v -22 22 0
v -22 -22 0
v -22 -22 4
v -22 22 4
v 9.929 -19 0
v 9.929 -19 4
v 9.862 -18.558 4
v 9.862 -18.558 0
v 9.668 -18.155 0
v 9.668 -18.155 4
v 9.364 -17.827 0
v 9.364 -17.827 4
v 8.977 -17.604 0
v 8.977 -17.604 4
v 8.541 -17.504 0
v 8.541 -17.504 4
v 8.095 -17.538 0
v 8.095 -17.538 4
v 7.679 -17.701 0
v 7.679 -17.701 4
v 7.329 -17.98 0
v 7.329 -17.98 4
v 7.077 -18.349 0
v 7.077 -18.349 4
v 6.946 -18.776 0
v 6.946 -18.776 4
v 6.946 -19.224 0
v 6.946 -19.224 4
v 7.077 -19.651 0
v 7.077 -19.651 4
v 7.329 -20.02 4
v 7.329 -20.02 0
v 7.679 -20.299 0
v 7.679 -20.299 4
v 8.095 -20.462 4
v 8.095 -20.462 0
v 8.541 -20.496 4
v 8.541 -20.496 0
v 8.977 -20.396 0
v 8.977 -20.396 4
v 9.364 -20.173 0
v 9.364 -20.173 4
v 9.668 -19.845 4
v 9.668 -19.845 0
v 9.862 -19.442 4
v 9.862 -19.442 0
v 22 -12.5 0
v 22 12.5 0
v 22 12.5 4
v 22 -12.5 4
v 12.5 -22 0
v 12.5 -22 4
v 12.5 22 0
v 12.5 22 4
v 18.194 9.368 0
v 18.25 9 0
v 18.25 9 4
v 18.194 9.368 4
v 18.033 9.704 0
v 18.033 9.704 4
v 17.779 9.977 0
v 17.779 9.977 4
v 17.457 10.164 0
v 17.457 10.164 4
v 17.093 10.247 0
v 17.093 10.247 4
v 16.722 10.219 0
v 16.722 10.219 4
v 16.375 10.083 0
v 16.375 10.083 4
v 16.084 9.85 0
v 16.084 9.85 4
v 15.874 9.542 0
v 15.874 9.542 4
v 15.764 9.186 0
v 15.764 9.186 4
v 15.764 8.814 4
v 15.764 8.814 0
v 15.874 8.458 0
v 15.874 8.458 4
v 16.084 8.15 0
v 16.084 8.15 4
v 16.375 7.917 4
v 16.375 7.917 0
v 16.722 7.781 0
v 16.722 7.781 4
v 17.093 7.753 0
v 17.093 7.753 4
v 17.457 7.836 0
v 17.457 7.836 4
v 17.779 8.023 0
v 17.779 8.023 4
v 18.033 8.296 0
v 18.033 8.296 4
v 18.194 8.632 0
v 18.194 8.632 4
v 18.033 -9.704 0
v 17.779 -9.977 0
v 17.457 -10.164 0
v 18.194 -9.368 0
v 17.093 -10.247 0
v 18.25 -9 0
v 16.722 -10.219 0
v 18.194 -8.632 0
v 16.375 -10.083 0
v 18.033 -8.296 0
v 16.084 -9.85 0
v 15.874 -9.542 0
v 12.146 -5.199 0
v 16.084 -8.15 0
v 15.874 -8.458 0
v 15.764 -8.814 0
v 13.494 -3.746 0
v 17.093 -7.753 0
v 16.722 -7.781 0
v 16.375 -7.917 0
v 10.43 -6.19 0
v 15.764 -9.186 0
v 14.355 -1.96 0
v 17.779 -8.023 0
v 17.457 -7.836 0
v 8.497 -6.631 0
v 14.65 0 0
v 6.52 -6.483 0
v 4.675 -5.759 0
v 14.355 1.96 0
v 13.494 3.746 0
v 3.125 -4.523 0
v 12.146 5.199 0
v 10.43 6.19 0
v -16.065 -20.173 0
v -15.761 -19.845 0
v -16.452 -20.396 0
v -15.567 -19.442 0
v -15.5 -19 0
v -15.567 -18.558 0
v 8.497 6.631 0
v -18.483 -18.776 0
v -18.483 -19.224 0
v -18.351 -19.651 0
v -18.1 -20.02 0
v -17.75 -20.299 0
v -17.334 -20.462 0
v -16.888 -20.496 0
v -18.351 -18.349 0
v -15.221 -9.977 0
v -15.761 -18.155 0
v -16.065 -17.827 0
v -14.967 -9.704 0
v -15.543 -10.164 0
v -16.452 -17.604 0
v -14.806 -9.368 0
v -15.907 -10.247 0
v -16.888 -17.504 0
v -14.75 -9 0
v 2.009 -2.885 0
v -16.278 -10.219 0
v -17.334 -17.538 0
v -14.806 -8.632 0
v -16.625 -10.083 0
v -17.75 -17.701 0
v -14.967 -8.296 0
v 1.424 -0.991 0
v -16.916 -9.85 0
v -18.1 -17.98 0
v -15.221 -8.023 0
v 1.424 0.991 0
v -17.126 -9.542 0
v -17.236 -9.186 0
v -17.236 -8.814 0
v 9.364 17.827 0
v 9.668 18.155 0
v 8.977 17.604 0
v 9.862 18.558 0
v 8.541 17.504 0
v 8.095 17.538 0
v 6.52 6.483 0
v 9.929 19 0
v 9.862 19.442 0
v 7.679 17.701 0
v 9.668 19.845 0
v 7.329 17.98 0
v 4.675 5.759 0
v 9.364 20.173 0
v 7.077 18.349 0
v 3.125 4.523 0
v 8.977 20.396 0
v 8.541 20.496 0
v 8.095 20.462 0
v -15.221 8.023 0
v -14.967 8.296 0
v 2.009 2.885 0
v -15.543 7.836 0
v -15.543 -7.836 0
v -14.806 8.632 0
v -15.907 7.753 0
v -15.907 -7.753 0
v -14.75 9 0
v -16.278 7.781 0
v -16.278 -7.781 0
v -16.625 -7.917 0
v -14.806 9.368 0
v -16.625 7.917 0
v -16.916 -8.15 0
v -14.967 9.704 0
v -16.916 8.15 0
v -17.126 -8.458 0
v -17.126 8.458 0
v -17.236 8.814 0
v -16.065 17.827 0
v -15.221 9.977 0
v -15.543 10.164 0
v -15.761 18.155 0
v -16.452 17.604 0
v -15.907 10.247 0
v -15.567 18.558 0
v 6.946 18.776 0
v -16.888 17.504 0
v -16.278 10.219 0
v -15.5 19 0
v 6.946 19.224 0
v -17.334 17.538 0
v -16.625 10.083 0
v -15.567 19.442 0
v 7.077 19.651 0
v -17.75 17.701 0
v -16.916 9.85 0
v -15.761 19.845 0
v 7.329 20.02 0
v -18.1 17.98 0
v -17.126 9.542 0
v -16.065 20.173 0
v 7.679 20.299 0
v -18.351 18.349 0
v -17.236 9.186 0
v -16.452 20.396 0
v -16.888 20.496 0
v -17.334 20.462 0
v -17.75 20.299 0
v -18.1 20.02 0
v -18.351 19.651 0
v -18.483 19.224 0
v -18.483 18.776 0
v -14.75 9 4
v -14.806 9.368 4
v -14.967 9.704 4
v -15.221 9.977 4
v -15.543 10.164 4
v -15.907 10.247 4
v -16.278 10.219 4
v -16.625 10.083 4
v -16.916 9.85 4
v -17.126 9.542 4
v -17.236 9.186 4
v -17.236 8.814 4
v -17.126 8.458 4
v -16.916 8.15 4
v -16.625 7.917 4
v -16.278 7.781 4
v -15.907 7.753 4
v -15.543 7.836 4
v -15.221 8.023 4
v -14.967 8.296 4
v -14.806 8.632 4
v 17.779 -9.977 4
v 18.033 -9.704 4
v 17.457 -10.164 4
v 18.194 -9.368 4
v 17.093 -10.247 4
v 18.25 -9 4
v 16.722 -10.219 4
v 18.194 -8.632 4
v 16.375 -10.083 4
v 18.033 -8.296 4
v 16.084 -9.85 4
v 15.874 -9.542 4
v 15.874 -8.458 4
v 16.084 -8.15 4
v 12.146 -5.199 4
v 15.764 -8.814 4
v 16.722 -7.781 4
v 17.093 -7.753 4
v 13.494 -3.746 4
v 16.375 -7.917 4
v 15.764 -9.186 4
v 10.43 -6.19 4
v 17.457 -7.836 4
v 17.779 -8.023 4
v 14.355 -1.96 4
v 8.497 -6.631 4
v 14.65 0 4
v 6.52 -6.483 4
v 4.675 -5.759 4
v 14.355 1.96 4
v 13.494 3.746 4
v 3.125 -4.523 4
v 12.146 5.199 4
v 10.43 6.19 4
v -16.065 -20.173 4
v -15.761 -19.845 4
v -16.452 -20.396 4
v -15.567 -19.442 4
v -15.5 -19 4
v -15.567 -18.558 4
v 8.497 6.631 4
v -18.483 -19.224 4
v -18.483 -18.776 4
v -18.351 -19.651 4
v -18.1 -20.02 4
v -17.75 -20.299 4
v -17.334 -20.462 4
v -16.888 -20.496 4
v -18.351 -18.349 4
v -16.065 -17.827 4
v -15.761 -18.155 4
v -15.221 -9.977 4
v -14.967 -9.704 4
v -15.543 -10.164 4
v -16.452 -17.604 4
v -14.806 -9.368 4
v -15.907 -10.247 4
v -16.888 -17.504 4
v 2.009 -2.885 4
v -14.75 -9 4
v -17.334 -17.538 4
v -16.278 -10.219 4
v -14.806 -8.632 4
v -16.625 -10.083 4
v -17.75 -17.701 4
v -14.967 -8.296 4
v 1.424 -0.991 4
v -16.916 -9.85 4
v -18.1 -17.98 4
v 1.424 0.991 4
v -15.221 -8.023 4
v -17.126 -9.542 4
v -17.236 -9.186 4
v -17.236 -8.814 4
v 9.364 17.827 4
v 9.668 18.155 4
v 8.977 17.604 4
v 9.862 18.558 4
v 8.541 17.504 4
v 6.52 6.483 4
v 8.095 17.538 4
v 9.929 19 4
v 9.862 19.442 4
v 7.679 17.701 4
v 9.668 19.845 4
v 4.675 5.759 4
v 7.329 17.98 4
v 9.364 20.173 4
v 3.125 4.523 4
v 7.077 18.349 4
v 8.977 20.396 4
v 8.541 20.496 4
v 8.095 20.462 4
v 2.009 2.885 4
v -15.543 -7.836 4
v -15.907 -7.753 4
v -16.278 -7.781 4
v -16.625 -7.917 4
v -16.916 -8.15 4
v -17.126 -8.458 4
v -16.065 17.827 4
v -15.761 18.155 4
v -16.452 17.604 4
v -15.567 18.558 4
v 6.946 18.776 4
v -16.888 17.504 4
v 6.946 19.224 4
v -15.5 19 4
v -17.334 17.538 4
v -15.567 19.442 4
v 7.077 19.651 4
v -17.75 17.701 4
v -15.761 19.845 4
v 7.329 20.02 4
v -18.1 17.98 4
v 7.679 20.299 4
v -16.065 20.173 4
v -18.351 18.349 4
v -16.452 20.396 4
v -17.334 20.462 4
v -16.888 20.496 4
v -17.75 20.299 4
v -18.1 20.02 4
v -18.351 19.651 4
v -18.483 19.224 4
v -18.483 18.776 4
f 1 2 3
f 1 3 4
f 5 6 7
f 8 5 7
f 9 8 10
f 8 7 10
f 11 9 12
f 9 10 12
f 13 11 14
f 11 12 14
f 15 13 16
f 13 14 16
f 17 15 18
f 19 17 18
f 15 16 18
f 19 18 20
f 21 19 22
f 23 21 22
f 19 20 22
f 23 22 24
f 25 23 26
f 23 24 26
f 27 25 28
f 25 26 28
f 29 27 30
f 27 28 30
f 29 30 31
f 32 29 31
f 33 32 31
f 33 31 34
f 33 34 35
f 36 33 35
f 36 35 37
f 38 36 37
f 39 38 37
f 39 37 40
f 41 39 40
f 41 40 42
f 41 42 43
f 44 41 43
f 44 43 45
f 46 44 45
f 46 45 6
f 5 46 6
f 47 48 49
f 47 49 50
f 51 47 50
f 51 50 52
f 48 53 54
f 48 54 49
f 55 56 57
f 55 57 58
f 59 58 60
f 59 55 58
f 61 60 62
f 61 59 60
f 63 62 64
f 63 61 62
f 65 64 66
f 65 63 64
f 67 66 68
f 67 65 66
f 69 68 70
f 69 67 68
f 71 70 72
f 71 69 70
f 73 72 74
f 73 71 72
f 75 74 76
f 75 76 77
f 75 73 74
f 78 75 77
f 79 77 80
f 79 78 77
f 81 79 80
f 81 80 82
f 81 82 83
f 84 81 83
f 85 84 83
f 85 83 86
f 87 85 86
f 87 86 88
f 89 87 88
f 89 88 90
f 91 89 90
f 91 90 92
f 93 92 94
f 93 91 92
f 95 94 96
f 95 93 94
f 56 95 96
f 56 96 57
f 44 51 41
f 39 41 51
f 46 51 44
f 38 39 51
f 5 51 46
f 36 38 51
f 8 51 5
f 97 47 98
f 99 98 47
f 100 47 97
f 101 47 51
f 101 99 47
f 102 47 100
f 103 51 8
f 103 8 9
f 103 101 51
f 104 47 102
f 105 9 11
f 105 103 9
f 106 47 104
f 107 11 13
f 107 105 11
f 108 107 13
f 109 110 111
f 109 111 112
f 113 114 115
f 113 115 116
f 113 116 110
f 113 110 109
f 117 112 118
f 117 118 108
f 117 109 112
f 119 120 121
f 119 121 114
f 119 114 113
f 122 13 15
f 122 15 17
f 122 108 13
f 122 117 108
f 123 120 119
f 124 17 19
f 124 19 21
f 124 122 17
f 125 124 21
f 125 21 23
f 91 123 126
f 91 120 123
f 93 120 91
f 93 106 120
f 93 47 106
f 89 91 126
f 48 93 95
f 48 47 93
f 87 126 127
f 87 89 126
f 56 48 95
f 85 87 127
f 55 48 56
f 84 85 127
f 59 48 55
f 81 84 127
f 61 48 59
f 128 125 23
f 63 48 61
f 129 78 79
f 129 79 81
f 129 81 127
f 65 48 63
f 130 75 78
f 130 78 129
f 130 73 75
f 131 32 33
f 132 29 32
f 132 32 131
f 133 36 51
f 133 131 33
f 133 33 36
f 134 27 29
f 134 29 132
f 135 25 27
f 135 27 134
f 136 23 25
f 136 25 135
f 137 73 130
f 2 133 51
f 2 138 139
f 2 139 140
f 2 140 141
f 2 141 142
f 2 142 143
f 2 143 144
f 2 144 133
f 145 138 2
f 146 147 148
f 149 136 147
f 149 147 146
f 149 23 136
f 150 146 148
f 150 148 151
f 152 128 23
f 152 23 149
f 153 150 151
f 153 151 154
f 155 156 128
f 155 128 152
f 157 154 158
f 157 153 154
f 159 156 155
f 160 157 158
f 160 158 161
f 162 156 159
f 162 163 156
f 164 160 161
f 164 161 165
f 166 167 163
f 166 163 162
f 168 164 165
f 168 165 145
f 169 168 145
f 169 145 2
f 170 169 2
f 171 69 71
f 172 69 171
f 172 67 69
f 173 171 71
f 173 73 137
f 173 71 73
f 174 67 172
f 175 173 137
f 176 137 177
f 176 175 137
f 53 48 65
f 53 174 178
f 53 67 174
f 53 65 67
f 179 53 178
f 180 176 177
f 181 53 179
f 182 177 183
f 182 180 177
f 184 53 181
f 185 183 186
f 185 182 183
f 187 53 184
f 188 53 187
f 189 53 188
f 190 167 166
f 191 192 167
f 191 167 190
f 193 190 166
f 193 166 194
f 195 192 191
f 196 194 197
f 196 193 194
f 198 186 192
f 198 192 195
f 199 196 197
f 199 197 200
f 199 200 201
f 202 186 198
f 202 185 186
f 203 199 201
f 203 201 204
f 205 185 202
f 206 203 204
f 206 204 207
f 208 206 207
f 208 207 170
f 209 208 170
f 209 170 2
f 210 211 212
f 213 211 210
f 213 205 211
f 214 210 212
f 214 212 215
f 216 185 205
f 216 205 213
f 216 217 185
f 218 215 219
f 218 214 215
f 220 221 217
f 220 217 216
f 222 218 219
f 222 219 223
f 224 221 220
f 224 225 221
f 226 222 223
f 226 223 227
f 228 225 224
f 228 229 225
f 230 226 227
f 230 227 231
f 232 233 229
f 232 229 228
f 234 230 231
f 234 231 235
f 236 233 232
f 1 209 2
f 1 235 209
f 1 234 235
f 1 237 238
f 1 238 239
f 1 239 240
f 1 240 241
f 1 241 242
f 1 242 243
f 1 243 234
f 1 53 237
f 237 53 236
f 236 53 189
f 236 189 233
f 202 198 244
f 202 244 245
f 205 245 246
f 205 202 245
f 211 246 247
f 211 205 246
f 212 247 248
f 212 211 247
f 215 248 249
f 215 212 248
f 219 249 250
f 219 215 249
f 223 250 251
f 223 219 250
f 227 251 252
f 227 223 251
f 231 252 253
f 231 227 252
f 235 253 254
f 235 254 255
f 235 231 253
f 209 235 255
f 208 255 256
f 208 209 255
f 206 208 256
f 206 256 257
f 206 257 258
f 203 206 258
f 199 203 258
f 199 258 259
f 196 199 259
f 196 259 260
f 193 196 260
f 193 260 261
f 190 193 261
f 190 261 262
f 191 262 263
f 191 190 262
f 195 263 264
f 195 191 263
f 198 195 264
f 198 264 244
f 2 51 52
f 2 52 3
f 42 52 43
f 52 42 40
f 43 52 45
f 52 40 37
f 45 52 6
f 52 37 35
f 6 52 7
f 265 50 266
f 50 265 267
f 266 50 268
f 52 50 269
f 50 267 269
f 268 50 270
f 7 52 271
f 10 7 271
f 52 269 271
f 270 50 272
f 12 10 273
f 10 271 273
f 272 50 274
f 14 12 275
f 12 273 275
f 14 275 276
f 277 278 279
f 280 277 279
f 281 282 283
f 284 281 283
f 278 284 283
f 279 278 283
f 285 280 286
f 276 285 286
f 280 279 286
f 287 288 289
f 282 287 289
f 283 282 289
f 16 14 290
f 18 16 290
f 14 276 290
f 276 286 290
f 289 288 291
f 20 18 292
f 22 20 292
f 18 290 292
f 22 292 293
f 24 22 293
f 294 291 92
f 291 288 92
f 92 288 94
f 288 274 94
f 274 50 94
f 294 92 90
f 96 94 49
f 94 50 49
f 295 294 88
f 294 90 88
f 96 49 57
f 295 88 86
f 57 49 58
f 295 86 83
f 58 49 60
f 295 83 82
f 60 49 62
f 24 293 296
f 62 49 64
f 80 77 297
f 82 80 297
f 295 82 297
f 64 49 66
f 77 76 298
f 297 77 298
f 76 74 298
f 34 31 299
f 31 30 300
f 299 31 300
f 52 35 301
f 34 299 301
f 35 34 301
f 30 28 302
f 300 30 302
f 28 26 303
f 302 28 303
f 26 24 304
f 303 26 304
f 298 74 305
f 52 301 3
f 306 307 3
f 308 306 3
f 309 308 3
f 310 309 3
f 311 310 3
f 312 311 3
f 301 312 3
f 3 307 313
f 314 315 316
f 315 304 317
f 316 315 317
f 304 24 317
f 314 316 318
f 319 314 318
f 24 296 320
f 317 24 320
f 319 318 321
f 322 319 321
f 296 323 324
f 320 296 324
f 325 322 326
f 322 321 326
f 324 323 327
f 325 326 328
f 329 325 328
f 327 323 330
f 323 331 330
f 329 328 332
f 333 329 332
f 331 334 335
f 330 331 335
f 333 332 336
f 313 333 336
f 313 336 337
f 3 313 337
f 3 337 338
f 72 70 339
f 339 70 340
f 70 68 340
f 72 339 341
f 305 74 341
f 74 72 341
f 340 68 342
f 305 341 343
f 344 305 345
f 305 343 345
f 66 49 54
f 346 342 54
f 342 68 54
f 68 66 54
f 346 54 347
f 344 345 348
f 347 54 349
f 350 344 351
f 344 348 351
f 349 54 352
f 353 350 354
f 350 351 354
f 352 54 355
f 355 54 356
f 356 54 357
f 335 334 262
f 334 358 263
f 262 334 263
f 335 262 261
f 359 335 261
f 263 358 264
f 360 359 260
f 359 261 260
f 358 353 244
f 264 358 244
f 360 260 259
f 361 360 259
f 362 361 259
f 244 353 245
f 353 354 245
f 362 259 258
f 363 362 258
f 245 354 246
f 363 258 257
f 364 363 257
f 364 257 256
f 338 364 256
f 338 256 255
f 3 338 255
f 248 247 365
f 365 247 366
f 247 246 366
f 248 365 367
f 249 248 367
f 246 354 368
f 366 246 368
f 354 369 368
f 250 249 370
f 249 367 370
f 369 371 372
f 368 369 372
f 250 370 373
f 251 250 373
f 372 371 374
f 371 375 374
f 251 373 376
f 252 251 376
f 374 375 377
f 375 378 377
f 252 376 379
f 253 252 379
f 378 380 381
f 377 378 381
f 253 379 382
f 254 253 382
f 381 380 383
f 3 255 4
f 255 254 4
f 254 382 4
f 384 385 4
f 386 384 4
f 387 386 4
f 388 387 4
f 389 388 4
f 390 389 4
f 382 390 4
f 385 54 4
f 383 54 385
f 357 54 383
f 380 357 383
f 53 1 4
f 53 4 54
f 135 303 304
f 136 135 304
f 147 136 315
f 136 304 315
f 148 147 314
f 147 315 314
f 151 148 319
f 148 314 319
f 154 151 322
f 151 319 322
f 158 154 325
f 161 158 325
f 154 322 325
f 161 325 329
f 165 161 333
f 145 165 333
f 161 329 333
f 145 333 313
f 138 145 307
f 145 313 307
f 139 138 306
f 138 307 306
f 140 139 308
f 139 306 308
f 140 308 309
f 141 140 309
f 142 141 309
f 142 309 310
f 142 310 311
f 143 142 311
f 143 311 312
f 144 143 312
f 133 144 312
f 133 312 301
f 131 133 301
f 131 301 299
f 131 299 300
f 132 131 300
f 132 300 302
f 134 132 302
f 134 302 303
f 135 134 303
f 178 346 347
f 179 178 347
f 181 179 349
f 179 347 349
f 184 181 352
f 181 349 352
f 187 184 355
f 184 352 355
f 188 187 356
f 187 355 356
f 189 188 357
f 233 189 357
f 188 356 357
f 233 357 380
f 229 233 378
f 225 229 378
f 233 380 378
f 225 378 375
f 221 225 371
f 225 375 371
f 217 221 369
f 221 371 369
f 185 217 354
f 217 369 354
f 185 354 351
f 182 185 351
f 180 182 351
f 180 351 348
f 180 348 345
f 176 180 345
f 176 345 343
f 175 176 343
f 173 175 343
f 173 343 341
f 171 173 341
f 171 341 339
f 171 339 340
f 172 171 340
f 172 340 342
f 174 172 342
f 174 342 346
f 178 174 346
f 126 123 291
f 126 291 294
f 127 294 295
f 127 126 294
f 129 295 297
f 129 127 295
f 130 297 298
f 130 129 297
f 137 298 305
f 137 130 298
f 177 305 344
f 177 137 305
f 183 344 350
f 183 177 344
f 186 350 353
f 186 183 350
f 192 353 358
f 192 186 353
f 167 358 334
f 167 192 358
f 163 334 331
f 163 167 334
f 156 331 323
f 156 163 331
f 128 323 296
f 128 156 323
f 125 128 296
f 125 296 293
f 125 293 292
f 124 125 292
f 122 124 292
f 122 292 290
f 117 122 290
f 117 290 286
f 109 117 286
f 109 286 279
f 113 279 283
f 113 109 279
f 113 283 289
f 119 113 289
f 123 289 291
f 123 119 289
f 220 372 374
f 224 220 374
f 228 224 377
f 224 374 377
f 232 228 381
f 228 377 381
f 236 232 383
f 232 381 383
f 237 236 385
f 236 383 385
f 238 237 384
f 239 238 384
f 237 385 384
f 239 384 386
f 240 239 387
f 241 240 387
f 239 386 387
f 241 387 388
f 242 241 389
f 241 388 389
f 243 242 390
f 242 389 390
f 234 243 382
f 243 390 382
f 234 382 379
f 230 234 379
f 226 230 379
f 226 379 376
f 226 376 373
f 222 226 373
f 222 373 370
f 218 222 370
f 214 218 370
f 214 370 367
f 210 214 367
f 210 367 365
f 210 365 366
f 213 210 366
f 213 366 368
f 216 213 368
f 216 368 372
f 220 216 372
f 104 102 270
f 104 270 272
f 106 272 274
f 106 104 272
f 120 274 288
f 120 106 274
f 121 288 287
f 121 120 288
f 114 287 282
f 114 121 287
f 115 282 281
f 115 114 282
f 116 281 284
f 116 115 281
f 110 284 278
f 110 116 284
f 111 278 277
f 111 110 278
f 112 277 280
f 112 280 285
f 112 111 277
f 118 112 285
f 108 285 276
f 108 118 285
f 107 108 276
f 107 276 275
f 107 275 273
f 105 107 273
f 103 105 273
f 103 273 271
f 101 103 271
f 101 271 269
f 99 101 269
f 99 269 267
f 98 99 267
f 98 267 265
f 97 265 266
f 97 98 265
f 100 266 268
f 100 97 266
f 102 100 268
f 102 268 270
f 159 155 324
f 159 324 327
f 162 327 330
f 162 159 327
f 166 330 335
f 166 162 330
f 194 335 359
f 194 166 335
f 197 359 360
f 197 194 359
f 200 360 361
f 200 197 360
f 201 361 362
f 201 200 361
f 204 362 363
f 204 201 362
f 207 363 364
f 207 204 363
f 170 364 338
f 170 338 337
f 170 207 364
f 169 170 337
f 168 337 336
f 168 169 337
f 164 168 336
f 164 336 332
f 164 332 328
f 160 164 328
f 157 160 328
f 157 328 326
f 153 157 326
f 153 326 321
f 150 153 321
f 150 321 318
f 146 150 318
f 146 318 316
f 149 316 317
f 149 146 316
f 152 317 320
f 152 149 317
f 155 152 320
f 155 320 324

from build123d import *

# Parameters (mm, degrees)
SKETCH1_R           = 6.65
SKETCH1_R_2         = 1.25
BOSS_EXTRUDE1_DEPTH = 4
SKETCH2_R           = 1.5
CUT_EXTRUDE1_DEPTH  = 5


with BuildPart() as part:
    # Sketch1 → Boss-Extrude1 (new body)
    with BuildSketch(Plane.XY):
        Polygon((22, 12.5), (22, -12.5), (12.5, -22), (-22, -22), (-22, 22), (12.5, 22), align=None)
        with Locations((8, 0)):
            Circle(SKETCH1_R, mode=Mode.SUBTRACT)
        with Locations((17, 9)):
            Circle(SKETCH1_R_2, mode=Mode.SUBTRACT)
        with Locations((17, -9)):
            Circle(SKETCH1_R_2, mode=Mode.SUBTRACT)
        with Locations((-16, 9)):
            Circle(SKETCH1_R_2, mode=Mode.SUBTRACT)
        with Locations((-16, -9)):
            Circle(SKETCH1_R_2, mode=Mode.SUBTRACT)
    extrude(amount=BOSS_EXTRUDE1_DEPTH)

    # Sketch2 → Cut-Extrude1 (cut, through all)
    with BuildSketch(Plane.XY.offset(4)):
        with Locations((-17, -19)):
            Circle(SKETCH2_R)
        with Locations((8.428932188, -19)):
            Circle(SKETCH2_R)
        with Locations((-17, 19)):
            Circle(SKETCH2_R)
        with Locations((8.428932188, 19)):
            Circle(SKETCH2_R)
    extrude(amount=-CUT_EXTRUDE1_DEPTH, mode=Mode.SUBTRACT)


solid = part.part
